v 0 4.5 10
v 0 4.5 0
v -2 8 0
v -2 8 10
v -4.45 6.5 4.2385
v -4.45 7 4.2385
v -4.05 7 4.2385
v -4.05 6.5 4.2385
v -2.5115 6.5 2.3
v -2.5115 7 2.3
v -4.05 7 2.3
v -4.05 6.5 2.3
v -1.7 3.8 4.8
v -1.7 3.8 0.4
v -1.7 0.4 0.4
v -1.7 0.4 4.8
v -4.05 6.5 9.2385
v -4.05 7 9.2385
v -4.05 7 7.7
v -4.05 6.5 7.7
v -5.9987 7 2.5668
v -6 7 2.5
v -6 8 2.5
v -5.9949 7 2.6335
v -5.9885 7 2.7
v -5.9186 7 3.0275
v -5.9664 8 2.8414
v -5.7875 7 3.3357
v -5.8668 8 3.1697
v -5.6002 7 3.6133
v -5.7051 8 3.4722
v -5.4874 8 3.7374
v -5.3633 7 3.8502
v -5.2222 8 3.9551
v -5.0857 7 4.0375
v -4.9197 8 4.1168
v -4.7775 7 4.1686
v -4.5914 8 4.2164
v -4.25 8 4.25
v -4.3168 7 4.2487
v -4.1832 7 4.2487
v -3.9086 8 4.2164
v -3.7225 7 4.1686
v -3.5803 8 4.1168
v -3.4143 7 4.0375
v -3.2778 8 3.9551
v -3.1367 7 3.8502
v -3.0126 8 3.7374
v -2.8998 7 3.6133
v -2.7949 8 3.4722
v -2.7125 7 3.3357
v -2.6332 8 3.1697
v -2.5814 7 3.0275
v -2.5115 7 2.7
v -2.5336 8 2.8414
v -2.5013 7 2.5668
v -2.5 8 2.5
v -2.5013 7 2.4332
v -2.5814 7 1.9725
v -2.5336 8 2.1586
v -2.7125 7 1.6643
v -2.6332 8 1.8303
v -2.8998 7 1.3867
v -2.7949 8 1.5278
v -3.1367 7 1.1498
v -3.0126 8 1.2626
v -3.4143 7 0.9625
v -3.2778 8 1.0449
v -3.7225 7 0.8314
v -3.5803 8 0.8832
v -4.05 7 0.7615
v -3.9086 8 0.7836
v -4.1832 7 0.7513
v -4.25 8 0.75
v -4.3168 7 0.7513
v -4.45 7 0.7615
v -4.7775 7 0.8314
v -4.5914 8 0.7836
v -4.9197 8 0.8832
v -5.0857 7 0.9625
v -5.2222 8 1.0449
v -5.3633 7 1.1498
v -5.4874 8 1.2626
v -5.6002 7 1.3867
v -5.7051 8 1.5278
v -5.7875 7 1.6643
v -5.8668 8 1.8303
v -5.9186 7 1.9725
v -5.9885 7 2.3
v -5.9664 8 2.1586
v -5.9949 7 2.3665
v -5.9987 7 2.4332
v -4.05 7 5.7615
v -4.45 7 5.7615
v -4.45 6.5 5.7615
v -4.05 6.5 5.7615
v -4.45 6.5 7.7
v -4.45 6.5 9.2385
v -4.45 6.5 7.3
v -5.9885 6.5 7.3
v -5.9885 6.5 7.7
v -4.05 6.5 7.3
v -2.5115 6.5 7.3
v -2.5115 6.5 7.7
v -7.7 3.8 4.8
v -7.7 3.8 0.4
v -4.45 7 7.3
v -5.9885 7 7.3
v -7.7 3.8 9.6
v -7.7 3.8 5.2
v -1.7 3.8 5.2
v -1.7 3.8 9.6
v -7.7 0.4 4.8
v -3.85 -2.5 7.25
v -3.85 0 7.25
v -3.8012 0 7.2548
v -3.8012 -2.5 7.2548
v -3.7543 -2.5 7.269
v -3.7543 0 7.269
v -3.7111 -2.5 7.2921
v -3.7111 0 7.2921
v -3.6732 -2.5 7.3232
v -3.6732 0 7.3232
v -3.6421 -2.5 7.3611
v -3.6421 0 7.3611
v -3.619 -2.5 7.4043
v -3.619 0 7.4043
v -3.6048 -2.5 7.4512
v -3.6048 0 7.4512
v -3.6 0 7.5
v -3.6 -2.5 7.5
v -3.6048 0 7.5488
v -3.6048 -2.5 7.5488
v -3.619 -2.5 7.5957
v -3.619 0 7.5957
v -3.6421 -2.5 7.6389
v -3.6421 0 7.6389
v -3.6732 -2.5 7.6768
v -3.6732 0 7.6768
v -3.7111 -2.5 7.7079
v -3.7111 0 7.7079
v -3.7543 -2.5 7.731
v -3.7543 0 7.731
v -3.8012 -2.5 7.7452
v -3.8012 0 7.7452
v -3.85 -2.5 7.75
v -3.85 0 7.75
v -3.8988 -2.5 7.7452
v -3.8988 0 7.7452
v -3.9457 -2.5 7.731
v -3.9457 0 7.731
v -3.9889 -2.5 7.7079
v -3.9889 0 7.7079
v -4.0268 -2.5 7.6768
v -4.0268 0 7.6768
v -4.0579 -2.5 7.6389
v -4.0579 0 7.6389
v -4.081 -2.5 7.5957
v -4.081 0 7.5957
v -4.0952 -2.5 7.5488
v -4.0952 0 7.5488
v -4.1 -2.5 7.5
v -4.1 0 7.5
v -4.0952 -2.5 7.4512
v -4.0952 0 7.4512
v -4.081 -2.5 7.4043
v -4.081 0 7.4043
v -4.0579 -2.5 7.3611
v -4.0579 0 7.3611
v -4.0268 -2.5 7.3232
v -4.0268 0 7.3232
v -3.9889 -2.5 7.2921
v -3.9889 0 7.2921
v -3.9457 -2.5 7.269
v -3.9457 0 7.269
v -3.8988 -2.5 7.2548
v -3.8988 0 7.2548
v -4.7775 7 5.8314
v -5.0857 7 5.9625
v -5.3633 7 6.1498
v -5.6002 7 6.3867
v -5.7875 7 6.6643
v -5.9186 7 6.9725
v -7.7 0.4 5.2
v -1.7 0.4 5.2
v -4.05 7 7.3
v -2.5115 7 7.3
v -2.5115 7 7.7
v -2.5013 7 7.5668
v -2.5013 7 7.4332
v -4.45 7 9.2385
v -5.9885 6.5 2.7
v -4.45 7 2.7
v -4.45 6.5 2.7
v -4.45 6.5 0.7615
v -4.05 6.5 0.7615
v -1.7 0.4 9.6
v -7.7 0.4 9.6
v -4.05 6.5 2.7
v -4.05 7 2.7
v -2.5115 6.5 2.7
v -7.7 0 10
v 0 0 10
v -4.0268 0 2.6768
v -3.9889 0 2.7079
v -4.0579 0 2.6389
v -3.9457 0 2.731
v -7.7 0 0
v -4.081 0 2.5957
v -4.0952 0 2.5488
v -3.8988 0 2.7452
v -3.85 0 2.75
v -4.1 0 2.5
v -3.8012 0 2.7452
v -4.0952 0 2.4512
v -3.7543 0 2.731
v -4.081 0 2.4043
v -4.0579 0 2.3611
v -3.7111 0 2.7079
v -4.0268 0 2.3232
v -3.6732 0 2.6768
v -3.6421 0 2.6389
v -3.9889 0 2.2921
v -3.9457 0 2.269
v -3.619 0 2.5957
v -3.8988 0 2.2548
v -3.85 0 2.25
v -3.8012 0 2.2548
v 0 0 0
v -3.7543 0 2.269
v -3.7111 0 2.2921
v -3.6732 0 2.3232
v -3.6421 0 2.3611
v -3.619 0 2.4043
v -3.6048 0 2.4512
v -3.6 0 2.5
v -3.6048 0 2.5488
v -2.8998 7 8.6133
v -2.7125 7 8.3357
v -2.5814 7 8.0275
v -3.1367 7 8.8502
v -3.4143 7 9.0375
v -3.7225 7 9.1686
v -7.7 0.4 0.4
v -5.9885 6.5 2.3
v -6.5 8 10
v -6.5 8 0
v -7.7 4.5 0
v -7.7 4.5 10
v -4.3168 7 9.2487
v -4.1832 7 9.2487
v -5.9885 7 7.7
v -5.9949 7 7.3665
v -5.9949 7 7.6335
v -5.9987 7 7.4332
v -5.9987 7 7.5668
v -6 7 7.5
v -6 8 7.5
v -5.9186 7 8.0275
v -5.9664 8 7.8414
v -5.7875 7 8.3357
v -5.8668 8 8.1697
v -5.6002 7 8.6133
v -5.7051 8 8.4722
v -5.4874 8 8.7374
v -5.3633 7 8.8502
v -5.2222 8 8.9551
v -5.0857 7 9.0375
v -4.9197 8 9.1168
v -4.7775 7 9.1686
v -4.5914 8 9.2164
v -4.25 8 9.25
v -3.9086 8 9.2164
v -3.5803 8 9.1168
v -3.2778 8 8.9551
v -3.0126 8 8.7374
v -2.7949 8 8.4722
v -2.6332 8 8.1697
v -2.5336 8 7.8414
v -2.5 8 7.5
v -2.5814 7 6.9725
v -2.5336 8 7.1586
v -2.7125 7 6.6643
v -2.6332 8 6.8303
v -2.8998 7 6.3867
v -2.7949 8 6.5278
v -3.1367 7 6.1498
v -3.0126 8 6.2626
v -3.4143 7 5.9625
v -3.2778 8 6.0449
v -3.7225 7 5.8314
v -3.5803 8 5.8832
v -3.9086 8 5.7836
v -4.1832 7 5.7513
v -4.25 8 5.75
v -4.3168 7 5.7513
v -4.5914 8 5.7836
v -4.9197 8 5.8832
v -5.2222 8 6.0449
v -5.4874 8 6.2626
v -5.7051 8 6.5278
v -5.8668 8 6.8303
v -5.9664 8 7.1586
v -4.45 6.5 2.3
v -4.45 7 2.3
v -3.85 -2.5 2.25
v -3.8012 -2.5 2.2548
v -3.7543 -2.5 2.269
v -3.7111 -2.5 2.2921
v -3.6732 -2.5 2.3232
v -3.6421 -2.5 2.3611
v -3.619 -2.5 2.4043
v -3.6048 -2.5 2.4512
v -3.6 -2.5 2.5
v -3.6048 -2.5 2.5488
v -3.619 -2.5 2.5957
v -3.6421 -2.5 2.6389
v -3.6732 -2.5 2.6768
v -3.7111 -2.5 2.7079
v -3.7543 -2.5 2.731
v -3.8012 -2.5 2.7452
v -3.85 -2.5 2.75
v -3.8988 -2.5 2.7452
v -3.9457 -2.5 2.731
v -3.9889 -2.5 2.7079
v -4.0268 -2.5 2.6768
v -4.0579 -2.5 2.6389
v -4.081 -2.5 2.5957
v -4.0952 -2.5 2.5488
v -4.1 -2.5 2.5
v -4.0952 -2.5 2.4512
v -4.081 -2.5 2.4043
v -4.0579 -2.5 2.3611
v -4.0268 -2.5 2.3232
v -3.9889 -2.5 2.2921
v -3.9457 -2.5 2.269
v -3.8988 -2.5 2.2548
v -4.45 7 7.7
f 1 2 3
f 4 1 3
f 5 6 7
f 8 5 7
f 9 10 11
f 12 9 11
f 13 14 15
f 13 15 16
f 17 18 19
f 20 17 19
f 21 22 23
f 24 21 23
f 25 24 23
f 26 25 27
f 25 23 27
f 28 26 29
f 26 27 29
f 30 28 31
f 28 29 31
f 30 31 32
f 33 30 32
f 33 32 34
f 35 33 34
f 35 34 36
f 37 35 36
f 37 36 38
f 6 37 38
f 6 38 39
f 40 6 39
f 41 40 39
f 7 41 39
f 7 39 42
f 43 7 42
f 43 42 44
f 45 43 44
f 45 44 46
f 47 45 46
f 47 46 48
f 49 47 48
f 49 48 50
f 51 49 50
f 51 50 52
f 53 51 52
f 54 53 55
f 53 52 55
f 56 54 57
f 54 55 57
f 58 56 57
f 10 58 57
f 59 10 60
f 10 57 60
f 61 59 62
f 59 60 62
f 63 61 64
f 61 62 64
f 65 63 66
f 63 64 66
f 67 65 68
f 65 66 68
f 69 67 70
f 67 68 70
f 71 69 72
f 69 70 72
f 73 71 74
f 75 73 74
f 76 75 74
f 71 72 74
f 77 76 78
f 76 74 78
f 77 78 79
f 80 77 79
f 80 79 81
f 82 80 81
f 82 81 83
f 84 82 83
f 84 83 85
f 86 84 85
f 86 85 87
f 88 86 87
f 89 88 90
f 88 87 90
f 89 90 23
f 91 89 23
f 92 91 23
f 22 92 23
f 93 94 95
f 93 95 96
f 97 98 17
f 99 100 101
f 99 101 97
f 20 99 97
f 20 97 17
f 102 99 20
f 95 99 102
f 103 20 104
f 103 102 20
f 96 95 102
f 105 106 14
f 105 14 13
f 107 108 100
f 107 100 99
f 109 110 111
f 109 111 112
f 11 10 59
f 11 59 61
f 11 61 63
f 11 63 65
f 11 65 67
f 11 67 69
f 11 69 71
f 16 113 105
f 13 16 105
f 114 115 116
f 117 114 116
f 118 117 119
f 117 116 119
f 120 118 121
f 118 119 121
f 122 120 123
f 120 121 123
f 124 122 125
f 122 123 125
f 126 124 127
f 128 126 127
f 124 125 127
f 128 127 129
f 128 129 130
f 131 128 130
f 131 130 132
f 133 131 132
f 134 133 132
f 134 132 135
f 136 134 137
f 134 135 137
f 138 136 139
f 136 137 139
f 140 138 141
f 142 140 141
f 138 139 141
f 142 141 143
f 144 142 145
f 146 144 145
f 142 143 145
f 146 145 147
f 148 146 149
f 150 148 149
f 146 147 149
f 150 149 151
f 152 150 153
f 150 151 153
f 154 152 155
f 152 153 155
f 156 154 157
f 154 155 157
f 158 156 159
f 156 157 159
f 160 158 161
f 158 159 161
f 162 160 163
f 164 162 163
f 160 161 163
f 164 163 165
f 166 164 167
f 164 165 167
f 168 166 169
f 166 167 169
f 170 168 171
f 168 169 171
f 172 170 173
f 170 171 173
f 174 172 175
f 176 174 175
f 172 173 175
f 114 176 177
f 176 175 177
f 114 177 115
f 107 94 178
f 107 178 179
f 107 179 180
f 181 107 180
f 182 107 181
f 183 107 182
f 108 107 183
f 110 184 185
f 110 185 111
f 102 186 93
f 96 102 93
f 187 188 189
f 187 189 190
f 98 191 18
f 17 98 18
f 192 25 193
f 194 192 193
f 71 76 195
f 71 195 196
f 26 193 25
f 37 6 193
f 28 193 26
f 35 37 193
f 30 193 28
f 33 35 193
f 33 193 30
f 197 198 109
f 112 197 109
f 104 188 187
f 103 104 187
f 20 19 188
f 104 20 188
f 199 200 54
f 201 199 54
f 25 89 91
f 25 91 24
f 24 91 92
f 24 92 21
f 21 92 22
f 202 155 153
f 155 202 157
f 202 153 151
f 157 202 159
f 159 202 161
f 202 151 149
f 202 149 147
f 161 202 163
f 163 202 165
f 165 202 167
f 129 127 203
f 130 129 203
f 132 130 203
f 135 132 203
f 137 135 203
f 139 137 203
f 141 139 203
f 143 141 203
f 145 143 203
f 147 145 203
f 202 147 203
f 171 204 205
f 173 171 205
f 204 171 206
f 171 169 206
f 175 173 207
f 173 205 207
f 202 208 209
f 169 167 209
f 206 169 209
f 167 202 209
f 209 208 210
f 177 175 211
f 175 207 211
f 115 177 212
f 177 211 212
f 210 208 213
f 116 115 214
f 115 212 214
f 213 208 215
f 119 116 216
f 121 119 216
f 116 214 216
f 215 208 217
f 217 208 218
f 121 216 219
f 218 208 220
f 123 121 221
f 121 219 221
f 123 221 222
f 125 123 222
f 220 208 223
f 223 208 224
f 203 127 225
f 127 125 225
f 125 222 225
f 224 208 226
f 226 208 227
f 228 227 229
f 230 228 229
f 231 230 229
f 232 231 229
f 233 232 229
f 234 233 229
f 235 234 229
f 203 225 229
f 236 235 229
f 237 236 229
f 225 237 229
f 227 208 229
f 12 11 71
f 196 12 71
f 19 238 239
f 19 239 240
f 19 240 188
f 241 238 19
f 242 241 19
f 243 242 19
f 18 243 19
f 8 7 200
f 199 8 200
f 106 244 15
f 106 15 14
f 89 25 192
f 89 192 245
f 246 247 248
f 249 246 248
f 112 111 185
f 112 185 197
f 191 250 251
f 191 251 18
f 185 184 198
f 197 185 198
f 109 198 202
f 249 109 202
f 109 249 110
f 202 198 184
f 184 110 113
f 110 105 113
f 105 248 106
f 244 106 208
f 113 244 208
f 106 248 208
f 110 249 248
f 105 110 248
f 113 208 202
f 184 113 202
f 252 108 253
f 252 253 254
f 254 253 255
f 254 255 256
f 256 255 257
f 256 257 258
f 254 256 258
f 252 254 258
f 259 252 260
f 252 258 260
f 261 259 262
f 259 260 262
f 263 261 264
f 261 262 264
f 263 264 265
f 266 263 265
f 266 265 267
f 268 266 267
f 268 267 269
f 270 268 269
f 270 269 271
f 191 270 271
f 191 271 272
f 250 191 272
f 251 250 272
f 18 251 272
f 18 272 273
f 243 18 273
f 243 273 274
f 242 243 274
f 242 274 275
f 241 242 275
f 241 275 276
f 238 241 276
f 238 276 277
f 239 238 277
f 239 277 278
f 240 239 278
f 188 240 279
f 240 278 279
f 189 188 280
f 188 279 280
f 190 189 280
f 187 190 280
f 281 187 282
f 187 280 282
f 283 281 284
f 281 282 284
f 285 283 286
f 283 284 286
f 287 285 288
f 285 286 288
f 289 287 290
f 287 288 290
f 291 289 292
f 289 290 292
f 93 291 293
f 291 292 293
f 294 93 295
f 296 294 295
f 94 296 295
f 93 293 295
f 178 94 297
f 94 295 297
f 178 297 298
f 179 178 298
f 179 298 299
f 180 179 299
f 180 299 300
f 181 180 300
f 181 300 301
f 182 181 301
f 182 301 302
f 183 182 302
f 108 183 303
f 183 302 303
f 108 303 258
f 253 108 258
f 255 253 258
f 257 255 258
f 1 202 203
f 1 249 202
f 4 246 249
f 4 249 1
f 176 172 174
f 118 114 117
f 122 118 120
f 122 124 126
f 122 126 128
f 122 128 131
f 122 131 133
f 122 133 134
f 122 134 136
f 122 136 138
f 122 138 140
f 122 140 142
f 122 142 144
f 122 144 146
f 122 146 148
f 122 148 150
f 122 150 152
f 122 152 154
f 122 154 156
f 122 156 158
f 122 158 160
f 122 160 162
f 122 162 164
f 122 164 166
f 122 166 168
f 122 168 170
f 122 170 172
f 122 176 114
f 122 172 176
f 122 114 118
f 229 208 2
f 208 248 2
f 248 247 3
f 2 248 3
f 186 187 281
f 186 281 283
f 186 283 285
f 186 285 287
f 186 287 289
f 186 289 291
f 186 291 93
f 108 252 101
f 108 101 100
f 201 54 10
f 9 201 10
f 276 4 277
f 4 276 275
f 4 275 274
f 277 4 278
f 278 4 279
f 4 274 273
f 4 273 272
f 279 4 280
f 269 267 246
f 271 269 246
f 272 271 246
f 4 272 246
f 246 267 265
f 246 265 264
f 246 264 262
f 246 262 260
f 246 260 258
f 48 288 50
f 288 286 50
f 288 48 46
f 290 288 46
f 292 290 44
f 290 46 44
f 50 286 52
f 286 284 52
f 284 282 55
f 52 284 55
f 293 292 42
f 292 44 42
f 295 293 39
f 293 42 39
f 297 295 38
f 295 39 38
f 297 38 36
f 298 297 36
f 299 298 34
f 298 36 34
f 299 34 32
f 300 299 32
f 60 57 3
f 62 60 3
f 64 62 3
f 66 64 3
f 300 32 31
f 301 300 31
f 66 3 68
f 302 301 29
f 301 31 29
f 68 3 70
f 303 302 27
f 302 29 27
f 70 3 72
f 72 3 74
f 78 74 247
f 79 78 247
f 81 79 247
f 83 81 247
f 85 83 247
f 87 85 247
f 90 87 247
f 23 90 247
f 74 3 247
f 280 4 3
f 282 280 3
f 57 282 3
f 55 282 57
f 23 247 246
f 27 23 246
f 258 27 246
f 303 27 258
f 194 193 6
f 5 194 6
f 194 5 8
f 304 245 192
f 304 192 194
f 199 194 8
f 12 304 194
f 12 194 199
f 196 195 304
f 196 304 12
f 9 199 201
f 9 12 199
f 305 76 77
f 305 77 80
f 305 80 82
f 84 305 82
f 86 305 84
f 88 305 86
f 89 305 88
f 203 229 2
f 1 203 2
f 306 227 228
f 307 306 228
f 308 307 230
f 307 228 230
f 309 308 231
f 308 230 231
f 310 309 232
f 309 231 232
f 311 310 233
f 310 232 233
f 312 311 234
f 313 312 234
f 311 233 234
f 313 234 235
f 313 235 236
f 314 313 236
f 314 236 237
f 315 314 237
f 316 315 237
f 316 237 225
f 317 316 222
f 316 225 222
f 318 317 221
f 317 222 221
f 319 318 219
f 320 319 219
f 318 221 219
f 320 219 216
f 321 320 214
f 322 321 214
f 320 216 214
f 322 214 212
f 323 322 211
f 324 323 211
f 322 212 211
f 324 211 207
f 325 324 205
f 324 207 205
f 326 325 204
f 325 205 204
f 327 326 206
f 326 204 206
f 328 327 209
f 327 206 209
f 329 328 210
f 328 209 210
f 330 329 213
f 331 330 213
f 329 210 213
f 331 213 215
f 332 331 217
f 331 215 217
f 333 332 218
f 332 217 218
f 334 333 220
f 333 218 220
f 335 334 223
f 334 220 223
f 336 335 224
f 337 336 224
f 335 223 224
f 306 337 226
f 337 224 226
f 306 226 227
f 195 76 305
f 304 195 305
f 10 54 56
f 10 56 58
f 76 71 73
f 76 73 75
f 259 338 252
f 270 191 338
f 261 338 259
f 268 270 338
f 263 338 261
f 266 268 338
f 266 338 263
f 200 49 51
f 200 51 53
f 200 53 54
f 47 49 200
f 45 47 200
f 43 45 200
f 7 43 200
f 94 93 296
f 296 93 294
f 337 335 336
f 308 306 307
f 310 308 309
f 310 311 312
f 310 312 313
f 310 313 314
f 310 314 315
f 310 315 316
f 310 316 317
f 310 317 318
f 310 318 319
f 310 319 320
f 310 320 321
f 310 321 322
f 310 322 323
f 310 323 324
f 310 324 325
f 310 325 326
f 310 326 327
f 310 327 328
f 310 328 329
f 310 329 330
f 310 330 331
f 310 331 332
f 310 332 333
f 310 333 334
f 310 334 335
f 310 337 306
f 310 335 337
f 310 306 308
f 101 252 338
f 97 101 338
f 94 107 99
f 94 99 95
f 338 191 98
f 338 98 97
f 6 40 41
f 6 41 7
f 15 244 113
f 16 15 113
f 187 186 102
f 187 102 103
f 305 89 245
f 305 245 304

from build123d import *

# Parameters (mm, degrees)
BOSS_EXTRU_2_DEPTH      = 10
ESQUISSE2_W             = 4.4
ESQUISSE2_H             = 3.4
ENL_V_MAT_EXTRU_1_DEPTH = 6
ESQUISSE3_R             = 0.25
BOSS_EXTRU_3_DEPTH      = 2.5
ESQUISSE5_R             = 1.75
ENL_V_MAT_EXTRU_2_DEPTH = 1
ESQUISSE6_W             = 1.538533865
ESQUISSE6_H             = 0.4
ESQUISSE6_W_2           = 0.4
ESQUISSE6_H_2           = 1.538533865
ENL_V_MAT_EXTRU_3_DEPTH = 0.5


with BuildPart() as part:
    # Esquisse1 → Boss.-Extru.2 (new body)
    with BuildSketch(Plane.XY):
        Polygon((-7.7, 0), (0, 0), (0, 4.5), (-2, 8), (-6.5, 8), (-7.7, 4.5), align=None)
    extrude(amount=BOSS_EXTRU_2_DEPTH)

    # Esquisse2 → Enlèv. mat.-Extru.1 (cut)
    with BuildSketch(Plane.ZY.offset(7.7)):
        with Locations((2.6, 2.1)):
            Rectangle(ESQUISSE2_W, ESQUISSE2_H)
        with Locations((7.4, 2.1)):
            Rectangle(ESQUISSE2_W, ESQUISSE2_H)
    extrude(amount=-ENL_V_MAT_EXTRU_1_DEPTH, mode=Mode.SUBTRACT)

    # Esquisse3 → Boss.-Extru.3 (add)
    with BuildSketch(Plane(origin=(0, 0, 0), x_dir=(-1, 0, 0), z_dir=(0, -1, 0))):
        with Locations(Location((3.85, -2.5, 0), (0, 0, 90))):
            Circle(ESQUISSE3_R)
        with Locations(Location((3.85, -7.5, 0), (0, 0, 90))):
            Circle(ESQUISSE3_R)
    extrude(amount=BOSS_EXTRU_3_DEPTH)

    # Esquisse5 → Enlèv. mat.-Extru.2 (cut)
    with BuildSketch(Plane(origin=(0, 8, 0), x_dir=(1, 0, 0), z_dir=(0, 1, 0))):
        with Locations(Location((-4.25, -7.5, 0), (0, 0, 180))):
            Circle(ESQUISSE5_R)
        with Locations(Location((-4.25, -2.5, 0), (0, 0, 180))):
            Circle(ESQUISSE5_R)
    extrude(amount=-ENL_V_MAT_EXTRU_2_DEPTH, mode=Mode.SUBTRACT)

    # Esquisse6 → Enlèv. mat.-Extru.3 (cut)
    with BuildSketch(Plane(origin=(0, 7, 0), x_dir=(1, 0, 0), z_dir=(0, 1, 0))):
        with Locations((-5.219266933, -7.5)):
            Rectangle(ESQUISSE6_W, ESQUISSE6_H)
        with Locations((-4.25, -8.469266933)):
            Rectangle(ESQUISSE6_W_2, ESQUISSE6_H_2)
        with Locations((-3.280733067, -7.5)):
            Rectangle(ESQUISSE6_W, ESQUISSE6_H)
        with Locations((-4.25, -6.530733067)):
            Rectangle(ESQUISSE6_W_2, ESQUISSE6_H_2)
        with Locations((-4.25, -7.5)):
            Rectangle(ESQUISSE6_W_2, ESQUISSE6_H)
        with Locations((-4.25, -3.469266933)):
            Rectangle(ESQUISSE6_W_2, ESQUISSE6_H_2)
        with Locations((-4.25, -2.5)):
            Rectangle(ESQUISSE6_W_2, ESQUISSE6_H)
        with Locations((-3.280733067, -2.5)):
            Rectangle(ESQUISSE6_W, ESQUISSE6_H)
        with Locations((-4.25, -1.530733068)):
            Rectangle(ESQUISSE6_W_2, ESQUISSE6_H_2)
        with Locations((-5.219266933, -2.5)):
            Rectangle(ESQUISSE6_W, ESQUISSE6_H)
    extrude(amount=-ENL_V_MAT_EXTRU_3_DEPTH, mode=Mode.SUBTRACT)


solid = part.part
